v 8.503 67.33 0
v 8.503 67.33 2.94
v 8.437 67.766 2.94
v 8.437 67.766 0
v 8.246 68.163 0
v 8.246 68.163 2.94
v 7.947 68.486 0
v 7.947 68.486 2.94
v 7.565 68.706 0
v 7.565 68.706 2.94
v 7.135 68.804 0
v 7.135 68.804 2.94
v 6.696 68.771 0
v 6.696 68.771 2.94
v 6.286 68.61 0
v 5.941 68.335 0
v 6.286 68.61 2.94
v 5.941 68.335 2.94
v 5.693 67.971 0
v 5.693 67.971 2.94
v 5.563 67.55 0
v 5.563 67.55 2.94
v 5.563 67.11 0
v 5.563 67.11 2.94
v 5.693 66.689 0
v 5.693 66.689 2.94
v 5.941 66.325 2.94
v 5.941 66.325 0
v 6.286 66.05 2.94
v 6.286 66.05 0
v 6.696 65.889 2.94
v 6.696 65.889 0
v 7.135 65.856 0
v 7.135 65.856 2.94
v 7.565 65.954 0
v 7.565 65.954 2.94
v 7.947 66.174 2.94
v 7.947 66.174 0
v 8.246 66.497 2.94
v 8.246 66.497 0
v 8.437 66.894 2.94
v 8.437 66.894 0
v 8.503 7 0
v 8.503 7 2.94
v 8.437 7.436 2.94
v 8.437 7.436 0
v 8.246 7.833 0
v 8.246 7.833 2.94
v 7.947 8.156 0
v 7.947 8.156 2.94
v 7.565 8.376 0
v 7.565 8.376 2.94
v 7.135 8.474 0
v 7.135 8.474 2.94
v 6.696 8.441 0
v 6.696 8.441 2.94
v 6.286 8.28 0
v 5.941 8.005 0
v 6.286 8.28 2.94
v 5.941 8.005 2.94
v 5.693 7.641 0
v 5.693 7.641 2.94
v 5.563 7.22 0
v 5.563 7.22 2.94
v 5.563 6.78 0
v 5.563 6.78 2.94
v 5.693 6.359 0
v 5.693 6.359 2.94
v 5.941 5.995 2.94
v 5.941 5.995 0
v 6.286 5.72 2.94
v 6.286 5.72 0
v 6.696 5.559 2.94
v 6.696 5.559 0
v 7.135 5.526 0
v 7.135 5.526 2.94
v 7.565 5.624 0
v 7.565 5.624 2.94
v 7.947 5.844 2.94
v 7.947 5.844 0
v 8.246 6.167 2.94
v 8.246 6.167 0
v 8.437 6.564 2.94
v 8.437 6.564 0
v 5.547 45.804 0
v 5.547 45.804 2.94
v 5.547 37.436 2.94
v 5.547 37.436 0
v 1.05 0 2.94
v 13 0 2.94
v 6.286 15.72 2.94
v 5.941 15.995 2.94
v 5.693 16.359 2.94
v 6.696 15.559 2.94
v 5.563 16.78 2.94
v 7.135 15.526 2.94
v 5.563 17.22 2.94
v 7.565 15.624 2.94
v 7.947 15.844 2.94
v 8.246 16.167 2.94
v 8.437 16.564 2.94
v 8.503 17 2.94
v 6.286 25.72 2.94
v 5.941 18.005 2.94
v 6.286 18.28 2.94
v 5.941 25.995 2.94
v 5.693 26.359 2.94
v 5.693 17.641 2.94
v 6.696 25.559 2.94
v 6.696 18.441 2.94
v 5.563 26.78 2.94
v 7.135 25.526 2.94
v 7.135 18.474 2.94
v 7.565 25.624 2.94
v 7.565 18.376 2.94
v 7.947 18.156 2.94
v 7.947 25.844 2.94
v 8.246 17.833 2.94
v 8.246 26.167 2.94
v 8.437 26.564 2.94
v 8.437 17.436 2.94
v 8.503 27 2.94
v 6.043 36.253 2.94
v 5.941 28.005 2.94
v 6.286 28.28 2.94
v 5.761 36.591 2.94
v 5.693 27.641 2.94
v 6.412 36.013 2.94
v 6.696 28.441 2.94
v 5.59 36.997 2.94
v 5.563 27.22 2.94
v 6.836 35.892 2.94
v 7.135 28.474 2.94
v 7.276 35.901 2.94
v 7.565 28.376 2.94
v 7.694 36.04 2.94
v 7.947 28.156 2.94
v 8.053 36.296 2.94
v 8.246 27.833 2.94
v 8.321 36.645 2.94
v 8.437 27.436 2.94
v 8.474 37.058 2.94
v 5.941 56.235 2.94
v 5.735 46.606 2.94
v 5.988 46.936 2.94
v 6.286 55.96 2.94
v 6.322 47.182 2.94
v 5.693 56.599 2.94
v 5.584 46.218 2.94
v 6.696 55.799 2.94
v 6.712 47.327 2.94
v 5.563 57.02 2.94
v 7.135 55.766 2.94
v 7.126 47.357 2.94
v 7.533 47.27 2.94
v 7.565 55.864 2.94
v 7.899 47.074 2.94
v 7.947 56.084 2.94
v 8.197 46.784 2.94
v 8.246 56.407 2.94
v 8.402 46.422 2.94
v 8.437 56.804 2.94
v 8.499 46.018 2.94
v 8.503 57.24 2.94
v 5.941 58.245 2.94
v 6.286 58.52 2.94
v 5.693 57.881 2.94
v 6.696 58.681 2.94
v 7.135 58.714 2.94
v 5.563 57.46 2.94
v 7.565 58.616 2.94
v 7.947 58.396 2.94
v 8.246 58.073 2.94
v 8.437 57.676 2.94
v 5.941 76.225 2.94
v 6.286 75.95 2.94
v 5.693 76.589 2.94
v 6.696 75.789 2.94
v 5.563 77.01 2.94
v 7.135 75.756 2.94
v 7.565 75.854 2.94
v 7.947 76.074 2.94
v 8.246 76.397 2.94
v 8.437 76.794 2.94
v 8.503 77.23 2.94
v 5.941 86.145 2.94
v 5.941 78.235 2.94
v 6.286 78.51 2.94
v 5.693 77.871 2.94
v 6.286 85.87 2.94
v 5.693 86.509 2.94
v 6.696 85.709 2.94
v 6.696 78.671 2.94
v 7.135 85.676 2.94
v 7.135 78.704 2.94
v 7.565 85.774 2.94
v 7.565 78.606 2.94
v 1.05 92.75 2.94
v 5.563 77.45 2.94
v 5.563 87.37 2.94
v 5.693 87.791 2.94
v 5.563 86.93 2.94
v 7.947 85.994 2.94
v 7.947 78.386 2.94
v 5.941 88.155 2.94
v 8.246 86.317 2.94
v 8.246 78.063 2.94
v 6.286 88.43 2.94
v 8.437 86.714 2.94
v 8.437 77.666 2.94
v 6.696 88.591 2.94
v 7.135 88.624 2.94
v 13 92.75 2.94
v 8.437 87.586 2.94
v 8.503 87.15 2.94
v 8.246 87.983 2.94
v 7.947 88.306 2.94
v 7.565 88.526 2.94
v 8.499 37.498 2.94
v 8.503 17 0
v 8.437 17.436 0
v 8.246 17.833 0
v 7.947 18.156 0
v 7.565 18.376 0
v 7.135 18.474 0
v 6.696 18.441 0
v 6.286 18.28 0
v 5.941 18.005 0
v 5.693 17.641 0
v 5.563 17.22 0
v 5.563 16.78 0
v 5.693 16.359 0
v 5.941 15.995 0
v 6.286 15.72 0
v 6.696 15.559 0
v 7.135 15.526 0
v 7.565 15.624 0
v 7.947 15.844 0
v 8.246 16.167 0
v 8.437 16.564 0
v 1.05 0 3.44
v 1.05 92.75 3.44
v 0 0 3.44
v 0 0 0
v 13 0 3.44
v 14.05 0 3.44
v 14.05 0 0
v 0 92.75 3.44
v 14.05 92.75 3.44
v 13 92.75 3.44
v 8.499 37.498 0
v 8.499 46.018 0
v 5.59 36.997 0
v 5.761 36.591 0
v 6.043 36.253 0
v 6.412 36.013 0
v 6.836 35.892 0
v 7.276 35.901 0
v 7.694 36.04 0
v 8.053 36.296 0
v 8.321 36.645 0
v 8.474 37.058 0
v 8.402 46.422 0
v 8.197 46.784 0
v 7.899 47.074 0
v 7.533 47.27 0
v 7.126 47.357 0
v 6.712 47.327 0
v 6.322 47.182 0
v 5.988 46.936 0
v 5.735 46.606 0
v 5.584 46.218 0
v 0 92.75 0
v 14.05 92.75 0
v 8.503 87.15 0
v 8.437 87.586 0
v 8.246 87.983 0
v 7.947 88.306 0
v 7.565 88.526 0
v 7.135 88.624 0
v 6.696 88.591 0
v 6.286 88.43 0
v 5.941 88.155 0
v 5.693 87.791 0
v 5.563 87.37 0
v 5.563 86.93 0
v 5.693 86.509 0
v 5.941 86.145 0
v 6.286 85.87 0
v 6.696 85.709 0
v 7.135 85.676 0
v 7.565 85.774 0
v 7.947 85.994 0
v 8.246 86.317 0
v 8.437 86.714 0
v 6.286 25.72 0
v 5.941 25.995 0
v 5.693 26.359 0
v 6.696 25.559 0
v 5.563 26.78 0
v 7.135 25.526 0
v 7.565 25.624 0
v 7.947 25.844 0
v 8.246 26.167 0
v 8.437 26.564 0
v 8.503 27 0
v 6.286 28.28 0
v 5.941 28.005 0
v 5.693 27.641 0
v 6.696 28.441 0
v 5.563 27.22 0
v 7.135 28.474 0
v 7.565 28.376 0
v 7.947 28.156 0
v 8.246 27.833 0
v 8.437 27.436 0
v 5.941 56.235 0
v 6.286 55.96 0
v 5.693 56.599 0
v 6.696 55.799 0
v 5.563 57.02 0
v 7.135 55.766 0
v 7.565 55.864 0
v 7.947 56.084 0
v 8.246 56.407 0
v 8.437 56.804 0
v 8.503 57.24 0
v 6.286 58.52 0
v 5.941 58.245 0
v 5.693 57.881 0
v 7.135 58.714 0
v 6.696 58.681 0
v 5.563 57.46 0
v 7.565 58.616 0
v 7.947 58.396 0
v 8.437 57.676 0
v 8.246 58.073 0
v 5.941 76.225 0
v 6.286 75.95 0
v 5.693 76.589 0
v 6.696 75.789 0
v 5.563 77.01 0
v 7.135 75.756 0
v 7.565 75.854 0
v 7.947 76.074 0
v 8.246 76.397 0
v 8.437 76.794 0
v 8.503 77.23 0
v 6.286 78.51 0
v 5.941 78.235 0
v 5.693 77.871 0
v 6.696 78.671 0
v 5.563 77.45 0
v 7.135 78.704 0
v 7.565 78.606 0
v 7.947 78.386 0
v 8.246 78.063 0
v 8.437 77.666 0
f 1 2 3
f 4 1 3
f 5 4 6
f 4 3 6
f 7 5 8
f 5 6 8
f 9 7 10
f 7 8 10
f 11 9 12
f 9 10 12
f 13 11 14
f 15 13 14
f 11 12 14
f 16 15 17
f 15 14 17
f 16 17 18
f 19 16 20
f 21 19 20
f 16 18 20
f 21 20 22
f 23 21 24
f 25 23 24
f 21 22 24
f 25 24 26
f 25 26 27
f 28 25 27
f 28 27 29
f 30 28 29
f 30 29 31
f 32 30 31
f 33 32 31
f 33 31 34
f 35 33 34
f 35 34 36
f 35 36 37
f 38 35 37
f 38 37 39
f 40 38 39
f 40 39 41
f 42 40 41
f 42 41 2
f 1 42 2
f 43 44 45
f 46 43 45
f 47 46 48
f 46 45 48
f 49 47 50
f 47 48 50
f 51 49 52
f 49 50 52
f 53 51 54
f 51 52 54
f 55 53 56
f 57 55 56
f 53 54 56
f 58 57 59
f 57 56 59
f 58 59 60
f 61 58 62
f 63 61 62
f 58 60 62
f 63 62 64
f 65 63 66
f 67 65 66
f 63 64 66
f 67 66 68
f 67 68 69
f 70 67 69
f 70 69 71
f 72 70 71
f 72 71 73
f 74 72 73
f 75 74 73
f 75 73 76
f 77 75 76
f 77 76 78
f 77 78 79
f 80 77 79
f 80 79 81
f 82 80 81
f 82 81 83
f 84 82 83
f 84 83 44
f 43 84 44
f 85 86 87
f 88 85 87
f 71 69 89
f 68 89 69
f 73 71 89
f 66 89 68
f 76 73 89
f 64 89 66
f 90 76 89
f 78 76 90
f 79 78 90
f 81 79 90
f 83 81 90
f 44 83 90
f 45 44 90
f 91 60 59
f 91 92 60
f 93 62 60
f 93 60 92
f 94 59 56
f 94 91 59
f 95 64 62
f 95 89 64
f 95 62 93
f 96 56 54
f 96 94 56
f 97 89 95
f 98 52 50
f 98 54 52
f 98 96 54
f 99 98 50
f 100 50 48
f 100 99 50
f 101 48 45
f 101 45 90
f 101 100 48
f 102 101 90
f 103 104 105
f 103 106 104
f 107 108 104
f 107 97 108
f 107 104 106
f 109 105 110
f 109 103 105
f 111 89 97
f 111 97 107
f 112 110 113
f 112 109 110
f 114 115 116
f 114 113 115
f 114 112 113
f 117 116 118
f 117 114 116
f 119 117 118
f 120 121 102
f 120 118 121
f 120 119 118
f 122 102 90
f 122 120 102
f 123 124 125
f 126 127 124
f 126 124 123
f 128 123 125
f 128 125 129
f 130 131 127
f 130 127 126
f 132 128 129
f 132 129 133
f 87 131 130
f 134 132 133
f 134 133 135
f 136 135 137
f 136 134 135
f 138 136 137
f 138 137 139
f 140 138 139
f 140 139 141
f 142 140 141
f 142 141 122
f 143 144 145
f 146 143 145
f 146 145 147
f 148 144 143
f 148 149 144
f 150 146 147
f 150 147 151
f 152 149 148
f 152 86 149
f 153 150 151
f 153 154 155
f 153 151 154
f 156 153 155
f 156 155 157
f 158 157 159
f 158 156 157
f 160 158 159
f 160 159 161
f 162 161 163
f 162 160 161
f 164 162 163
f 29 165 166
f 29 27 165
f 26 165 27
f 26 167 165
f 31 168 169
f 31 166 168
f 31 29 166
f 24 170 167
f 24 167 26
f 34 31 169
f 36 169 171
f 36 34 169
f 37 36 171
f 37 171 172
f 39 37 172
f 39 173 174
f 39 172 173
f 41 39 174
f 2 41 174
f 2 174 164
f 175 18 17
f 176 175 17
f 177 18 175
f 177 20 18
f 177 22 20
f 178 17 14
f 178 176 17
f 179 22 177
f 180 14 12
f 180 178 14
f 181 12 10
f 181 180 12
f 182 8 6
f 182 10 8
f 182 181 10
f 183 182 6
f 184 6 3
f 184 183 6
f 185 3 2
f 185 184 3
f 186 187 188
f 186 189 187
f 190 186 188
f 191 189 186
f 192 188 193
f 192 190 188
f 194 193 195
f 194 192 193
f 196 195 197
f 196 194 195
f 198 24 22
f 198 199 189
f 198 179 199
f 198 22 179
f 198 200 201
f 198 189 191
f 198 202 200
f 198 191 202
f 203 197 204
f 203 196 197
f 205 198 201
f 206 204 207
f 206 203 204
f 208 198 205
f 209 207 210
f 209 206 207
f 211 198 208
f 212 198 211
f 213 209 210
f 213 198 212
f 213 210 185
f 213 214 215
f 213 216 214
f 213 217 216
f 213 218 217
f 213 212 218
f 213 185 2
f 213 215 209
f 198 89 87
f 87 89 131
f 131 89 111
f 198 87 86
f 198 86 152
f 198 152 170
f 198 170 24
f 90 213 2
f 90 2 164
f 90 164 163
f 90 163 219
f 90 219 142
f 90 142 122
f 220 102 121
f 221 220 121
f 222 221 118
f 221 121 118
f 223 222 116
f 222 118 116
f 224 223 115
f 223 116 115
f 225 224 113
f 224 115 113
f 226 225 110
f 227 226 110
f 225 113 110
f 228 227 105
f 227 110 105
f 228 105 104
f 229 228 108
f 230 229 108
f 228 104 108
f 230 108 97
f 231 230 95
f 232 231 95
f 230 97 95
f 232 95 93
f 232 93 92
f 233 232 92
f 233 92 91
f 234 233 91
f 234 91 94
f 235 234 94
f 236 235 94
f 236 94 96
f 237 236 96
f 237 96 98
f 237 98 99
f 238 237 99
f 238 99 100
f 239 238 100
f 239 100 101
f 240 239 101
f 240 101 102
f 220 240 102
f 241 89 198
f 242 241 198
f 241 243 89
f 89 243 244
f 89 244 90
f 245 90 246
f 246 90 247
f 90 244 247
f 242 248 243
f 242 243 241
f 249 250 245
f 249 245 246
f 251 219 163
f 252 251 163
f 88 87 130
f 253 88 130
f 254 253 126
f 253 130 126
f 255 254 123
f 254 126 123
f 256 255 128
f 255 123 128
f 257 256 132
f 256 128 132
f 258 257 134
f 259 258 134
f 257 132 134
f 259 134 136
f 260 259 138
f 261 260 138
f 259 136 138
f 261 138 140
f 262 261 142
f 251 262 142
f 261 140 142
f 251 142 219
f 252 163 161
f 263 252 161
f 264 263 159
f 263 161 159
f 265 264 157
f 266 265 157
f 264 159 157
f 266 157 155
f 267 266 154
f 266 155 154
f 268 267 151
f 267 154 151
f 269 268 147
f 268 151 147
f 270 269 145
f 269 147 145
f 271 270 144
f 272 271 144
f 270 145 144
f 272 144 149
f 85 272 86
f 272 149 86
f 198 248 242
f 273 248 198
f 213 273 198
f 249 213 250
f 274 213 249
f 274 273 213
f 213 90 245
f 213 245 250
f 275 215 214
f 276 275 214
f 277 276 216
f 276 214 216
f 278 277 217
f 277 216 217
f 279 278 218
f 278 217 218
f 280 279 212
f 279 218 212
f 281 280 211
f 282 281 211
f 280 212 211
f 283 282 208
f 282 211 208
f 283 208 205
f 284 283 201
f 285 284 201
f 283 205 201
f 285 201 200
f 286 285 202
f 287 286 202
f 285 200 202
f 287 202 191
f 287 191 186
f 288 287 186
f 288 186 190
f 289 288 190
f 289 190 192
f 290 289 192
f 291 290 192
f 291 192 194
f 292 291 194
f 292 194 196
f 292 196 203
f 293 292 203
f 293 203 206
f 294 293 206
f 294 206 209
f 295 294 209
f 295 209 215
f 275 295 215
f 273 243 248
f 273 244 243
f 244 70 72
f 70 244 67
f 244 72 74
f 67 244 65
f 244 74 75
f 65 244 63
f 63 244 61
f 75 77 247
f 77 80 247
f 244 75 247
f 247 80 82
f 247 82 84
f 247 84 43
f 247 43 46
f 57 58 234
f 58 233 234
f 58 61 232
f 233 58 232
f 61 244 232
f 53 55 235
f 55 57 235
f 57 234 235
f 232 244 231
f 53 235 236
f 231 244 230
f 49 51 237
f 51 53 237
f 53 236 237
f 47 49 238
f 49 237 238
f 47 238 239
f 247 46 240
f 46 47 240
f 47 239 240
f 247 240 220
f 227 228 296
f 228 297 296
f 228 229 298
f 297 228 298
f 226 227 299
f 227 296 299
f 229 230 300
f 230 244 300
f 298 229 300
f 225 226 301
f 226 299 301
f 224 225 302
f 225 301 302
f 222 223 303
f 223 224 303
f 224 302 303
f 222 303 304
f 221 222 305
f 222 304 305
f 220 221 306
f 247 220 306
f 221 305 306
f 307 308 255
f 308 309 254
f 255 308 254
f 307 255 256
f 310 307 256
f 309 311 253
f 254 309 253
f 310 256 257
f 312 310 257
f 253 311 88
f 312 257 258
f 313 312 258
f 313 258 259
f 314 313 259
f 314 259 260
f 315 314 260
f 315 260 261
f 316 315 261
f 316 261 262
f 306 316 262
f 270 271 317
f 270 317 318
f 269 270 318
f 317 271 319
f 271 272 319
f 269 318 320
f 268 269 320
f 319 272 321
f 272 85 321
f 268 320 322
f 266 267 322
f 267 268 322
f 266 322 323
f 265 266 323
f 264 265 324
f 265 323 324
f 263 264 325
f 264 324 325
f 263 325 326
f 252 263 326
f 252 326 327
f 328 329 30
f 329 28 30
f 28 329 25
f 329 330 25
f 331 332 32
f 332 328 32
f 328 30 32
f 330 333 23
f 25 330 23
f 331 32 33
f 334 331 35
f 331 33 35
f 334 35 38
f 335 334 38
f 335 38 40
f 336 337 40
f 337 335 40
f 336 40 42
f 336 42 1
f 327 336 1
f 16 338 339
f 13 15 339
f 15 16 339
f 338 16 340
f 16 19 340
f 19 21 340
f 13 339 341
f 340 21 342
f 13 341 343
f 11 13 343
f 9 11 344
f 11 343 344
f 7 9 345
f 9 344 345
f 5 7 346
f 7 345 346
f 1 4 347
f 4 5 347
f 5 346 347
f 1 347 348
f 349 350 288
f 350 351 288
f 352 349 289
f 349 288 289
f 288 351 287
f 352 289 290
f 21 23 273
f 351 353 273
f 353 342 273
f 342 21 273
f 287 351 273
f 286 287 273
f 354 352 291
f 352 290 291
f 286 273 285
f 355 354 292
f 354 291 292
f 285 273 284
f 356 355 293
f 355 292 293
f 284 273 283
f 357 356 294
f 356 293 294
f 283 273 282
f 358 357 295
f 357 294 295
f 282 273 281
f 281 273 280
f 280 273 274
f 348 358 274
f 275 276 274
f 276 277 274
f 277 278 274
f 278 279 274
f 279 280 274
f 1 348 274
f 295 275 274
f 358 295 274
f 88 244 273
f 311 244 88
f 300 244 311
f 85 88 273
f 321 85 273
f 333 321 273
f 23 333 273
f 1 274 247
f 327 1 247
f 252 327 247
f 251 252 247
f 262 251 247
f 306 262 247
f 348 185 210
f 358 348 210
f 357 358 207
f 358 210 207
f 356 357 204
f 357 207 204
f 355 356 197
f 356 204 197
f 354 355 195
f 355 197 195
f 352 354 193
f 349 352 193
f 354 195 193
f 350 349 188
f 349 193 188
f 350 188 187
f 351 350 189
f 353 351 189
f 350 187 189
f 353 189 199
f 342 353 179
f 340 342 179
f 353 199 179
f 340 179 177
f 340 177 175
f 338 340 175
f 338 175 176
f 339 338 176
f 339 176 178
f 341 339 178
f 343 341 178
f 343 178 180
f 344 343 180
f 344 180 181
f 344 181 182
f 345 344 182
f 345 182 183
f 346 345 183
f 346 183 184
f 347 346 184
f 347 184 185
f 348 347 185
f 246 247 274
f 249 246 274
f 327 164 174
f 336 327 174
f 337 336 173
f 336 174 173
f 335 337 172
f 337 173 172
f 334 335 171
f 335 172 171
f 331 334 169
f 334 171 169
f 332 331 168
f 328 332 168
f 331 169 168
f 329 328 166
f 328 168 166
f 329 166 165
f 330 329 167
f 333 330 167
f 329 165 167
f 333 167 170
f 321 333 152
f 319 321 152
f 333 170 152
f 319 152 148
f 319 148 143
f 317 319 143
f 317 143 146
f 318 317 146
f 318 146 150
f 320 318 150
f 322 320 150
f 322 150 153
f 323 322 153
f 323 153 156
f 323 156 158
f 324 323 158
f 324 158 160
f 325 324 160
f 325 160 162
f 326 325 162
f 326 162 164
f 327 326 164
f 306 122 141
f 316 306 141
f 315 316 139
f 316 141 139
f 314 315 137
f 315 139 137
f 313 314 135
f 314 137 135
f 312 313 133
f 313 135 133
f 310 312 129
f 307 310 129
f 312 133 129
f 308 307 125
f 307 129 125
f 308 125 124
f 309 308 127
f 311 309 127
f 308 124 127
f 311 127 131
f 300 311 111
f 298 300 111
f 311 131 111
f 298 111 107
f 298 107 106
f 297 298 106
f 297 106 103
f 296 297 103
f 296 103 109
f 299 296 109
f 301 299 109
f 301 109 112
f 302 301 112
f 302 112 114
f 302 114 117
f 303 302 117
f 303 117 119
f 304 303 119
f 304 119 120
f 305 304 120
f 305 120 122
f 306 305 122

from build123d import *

# Parameters (mm, degrees)
F0_W     = 14.05
F0_H     = 92.75
F1_DEPTH = 2.94
F2_W     = 1.05
F2_H     = 92.75
F3_DEPTH = 0.5
F4_R     = 1.478073
F5_DEPTH = 2.941


with BuildPart() as f1:
    # F0 (on Top) → F1 (new body)
    with BuildSketch(Plane.XY):
        with Locations((7.025, 46.375)):
            Rectangle(F0_W, F0_H)
    extrude(amount=F1_DEPTH)

    # F2 (on face) → F3 (join)
    with BuildSketch(Plane.XY.offset(2.94)):
        with Locations((0.525, 46.375)):
            Rectangle(F2_W, F2_H)
        with Locations((13.525, 46.375)):
            Rectangle(F2_W, F2_H)
    extrude(amount=F3_DEPTH)

    # F4 (on face) → F5 (cut, through all)
    with BuildSketch(Plane.XY.offset(2.94)):
        with BuildLine():
            Line((5.546927, 45.804492), (5.546927, 37.435508))
            ThreePointArc((5.546927, 37.435508), (7.056423, 35.880334), (8.498534, 37.498191))
            Line((8.498534, 37.498191), (8.498534, 46.018191))
            ThreePointArc((8.498534, 46.018191), (6.918126, 47.356136), (5.546927, 45.804492))
        make_face()
        with Locations((7.025, 87.15)):
            Circle(F4_R)
        with Locations((7.025, 77.23)):
            Circle(F4_R)
        with Locations((7.025, 67.33)):
            Circle(F4_R)
        with Locations((7.025, 57.24)):
            Circle(F4_R)
        with Locations((7.025, 7)):
            Circle(F4_R)
        with Locations((7.025, 17)):
            Circle(F4_R)
        with Locations((7.025, 27)):
            Circle(F4_R)
    extrude(amount=-F5_DEPTH, mode=Mode.SUBTRACT)


solid = f1.part
